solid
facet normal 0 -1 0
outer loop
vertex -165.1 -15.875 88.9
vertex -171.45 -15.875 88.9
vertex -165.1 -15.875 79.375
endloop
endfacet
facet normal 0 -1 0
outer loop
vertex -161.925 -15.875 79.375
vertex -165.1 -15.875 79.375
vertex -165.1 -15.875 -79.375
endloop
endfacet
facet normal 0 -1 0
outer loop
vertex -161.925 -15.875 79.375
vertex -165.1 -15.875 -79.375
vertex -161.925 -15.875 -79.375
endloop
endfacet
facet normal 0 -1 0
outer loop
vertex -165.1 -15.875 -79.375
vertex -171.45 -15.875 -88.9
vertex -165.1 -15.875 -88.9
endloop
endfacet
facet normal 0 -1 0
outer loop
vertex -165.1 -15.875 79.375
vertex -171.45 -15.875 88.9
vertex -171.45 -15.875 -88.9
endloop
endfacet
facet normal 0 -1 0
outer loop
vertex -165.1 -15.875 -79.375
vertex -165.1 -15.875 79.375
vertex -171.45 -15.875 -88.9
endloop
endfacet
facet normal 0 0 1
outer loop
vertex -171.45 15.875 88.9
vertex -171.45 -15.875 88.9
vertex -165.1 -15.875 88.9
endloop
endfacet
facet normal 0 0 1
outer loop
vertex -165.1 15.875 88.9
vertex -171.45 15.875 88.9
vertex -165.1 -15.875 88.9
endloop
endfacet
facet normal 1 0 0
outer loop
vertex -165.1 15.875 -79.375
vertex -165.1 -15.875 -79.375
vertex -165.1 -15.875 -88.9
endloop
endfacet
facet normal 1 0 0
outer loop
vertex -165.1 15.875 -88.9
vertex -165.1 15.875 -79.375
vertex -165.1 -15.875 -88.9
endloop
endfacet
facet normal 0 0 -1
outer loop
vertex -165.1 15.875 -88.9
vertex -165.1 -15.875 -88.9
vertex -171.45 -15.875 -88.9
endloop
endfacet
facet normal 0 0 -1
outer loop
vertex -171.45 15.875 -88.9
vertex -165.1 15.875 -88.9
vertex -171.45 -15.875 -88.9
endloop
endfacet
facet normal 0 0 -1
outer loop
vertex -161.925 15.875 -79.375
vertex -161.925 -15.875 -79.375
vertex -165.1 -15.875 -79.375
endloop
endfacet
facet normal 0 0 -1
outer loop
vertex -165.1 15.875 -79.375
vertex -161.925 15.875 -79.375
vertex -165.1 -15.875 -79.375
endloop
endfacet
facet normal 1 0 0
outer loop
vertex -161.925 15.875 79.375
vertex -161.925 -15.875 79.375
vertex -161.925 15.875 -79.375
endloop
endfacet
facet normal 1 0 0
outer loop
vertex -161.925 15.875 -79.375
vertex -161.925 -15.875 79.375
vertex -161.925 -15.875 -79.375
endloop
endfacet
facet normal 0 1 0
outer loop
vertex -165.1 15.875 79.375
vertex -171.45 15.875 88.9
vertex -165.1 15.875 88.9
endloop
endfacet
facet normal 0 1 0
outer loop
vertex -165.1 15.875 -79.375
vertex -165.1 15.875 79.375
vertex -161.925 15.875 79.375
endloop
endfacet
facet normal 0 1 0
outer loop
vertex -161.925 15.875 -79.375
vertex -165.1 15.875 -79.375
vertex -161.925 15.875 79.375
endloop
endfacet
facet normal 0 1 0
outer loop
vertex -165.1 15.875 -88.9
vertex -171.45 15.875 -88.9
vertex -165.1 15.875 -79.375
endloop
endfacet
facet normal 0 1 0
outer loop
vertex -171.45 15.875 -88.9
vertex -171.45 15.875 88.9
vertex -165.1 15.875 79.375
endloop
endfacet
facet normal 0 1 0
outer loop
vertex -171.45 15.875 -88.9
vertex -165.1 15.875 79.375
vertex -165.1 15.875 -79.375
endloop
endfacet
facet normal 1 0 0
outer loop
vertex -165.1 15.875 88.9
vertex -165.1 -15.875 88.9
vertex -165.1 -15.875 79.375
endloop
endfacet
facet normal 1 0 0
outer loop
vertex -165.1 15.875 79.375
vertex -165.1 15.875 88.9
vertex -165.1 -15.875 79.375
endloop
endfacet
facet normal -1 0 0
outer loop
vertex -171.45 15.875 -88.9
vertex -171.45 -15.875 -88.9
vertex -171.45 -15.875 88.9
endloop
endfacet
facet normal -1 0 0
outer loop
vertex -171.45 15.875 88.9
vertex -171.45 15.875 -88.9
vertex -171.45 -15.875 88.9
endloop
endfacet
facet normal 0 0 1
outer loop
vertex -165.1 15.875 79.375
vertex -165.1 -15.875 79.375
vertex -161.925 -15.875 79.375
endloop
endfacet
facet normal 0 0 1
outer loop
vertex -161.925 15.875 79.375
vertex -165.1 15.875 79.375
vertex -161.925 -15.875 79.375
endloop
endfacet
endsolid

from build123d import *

# Parameters (mm, degrees)
BOSS_EXTRUDE1_DEPTH      = 15.875
BOSS_EXTRUDE1_DEPTH_BACK = 15.875


with BuildPart() as part:
    # Sketch2 → Boss-Extrude1 (new, two sides: drawn at the far end of the back side and taken through both)
    with BuildSketch(Plane(origin=(0, 0, 0), x_dir=(1, 0, 0), z_dir=(0, 1, 0)).offset(-BOSS_EXTRUDE1_DEPTH_BACK)):
        Polygon((-171.45, 88.9), (-171.45, -88.9), (-165.1, -88.9), (-165.1, -79.375), (-161.925, -79.375), (-161.925, 25.4), (-161.925, 34.925), (-161.925, 79.375), (-165.1, 79.375), (-165.1, 88.9), align=None)
    extrude(amount=BOSS_EXTRUDE1_DEPTH + BOSS_EXTRUDE1_DEPTH_BACK)


solid = part.part
